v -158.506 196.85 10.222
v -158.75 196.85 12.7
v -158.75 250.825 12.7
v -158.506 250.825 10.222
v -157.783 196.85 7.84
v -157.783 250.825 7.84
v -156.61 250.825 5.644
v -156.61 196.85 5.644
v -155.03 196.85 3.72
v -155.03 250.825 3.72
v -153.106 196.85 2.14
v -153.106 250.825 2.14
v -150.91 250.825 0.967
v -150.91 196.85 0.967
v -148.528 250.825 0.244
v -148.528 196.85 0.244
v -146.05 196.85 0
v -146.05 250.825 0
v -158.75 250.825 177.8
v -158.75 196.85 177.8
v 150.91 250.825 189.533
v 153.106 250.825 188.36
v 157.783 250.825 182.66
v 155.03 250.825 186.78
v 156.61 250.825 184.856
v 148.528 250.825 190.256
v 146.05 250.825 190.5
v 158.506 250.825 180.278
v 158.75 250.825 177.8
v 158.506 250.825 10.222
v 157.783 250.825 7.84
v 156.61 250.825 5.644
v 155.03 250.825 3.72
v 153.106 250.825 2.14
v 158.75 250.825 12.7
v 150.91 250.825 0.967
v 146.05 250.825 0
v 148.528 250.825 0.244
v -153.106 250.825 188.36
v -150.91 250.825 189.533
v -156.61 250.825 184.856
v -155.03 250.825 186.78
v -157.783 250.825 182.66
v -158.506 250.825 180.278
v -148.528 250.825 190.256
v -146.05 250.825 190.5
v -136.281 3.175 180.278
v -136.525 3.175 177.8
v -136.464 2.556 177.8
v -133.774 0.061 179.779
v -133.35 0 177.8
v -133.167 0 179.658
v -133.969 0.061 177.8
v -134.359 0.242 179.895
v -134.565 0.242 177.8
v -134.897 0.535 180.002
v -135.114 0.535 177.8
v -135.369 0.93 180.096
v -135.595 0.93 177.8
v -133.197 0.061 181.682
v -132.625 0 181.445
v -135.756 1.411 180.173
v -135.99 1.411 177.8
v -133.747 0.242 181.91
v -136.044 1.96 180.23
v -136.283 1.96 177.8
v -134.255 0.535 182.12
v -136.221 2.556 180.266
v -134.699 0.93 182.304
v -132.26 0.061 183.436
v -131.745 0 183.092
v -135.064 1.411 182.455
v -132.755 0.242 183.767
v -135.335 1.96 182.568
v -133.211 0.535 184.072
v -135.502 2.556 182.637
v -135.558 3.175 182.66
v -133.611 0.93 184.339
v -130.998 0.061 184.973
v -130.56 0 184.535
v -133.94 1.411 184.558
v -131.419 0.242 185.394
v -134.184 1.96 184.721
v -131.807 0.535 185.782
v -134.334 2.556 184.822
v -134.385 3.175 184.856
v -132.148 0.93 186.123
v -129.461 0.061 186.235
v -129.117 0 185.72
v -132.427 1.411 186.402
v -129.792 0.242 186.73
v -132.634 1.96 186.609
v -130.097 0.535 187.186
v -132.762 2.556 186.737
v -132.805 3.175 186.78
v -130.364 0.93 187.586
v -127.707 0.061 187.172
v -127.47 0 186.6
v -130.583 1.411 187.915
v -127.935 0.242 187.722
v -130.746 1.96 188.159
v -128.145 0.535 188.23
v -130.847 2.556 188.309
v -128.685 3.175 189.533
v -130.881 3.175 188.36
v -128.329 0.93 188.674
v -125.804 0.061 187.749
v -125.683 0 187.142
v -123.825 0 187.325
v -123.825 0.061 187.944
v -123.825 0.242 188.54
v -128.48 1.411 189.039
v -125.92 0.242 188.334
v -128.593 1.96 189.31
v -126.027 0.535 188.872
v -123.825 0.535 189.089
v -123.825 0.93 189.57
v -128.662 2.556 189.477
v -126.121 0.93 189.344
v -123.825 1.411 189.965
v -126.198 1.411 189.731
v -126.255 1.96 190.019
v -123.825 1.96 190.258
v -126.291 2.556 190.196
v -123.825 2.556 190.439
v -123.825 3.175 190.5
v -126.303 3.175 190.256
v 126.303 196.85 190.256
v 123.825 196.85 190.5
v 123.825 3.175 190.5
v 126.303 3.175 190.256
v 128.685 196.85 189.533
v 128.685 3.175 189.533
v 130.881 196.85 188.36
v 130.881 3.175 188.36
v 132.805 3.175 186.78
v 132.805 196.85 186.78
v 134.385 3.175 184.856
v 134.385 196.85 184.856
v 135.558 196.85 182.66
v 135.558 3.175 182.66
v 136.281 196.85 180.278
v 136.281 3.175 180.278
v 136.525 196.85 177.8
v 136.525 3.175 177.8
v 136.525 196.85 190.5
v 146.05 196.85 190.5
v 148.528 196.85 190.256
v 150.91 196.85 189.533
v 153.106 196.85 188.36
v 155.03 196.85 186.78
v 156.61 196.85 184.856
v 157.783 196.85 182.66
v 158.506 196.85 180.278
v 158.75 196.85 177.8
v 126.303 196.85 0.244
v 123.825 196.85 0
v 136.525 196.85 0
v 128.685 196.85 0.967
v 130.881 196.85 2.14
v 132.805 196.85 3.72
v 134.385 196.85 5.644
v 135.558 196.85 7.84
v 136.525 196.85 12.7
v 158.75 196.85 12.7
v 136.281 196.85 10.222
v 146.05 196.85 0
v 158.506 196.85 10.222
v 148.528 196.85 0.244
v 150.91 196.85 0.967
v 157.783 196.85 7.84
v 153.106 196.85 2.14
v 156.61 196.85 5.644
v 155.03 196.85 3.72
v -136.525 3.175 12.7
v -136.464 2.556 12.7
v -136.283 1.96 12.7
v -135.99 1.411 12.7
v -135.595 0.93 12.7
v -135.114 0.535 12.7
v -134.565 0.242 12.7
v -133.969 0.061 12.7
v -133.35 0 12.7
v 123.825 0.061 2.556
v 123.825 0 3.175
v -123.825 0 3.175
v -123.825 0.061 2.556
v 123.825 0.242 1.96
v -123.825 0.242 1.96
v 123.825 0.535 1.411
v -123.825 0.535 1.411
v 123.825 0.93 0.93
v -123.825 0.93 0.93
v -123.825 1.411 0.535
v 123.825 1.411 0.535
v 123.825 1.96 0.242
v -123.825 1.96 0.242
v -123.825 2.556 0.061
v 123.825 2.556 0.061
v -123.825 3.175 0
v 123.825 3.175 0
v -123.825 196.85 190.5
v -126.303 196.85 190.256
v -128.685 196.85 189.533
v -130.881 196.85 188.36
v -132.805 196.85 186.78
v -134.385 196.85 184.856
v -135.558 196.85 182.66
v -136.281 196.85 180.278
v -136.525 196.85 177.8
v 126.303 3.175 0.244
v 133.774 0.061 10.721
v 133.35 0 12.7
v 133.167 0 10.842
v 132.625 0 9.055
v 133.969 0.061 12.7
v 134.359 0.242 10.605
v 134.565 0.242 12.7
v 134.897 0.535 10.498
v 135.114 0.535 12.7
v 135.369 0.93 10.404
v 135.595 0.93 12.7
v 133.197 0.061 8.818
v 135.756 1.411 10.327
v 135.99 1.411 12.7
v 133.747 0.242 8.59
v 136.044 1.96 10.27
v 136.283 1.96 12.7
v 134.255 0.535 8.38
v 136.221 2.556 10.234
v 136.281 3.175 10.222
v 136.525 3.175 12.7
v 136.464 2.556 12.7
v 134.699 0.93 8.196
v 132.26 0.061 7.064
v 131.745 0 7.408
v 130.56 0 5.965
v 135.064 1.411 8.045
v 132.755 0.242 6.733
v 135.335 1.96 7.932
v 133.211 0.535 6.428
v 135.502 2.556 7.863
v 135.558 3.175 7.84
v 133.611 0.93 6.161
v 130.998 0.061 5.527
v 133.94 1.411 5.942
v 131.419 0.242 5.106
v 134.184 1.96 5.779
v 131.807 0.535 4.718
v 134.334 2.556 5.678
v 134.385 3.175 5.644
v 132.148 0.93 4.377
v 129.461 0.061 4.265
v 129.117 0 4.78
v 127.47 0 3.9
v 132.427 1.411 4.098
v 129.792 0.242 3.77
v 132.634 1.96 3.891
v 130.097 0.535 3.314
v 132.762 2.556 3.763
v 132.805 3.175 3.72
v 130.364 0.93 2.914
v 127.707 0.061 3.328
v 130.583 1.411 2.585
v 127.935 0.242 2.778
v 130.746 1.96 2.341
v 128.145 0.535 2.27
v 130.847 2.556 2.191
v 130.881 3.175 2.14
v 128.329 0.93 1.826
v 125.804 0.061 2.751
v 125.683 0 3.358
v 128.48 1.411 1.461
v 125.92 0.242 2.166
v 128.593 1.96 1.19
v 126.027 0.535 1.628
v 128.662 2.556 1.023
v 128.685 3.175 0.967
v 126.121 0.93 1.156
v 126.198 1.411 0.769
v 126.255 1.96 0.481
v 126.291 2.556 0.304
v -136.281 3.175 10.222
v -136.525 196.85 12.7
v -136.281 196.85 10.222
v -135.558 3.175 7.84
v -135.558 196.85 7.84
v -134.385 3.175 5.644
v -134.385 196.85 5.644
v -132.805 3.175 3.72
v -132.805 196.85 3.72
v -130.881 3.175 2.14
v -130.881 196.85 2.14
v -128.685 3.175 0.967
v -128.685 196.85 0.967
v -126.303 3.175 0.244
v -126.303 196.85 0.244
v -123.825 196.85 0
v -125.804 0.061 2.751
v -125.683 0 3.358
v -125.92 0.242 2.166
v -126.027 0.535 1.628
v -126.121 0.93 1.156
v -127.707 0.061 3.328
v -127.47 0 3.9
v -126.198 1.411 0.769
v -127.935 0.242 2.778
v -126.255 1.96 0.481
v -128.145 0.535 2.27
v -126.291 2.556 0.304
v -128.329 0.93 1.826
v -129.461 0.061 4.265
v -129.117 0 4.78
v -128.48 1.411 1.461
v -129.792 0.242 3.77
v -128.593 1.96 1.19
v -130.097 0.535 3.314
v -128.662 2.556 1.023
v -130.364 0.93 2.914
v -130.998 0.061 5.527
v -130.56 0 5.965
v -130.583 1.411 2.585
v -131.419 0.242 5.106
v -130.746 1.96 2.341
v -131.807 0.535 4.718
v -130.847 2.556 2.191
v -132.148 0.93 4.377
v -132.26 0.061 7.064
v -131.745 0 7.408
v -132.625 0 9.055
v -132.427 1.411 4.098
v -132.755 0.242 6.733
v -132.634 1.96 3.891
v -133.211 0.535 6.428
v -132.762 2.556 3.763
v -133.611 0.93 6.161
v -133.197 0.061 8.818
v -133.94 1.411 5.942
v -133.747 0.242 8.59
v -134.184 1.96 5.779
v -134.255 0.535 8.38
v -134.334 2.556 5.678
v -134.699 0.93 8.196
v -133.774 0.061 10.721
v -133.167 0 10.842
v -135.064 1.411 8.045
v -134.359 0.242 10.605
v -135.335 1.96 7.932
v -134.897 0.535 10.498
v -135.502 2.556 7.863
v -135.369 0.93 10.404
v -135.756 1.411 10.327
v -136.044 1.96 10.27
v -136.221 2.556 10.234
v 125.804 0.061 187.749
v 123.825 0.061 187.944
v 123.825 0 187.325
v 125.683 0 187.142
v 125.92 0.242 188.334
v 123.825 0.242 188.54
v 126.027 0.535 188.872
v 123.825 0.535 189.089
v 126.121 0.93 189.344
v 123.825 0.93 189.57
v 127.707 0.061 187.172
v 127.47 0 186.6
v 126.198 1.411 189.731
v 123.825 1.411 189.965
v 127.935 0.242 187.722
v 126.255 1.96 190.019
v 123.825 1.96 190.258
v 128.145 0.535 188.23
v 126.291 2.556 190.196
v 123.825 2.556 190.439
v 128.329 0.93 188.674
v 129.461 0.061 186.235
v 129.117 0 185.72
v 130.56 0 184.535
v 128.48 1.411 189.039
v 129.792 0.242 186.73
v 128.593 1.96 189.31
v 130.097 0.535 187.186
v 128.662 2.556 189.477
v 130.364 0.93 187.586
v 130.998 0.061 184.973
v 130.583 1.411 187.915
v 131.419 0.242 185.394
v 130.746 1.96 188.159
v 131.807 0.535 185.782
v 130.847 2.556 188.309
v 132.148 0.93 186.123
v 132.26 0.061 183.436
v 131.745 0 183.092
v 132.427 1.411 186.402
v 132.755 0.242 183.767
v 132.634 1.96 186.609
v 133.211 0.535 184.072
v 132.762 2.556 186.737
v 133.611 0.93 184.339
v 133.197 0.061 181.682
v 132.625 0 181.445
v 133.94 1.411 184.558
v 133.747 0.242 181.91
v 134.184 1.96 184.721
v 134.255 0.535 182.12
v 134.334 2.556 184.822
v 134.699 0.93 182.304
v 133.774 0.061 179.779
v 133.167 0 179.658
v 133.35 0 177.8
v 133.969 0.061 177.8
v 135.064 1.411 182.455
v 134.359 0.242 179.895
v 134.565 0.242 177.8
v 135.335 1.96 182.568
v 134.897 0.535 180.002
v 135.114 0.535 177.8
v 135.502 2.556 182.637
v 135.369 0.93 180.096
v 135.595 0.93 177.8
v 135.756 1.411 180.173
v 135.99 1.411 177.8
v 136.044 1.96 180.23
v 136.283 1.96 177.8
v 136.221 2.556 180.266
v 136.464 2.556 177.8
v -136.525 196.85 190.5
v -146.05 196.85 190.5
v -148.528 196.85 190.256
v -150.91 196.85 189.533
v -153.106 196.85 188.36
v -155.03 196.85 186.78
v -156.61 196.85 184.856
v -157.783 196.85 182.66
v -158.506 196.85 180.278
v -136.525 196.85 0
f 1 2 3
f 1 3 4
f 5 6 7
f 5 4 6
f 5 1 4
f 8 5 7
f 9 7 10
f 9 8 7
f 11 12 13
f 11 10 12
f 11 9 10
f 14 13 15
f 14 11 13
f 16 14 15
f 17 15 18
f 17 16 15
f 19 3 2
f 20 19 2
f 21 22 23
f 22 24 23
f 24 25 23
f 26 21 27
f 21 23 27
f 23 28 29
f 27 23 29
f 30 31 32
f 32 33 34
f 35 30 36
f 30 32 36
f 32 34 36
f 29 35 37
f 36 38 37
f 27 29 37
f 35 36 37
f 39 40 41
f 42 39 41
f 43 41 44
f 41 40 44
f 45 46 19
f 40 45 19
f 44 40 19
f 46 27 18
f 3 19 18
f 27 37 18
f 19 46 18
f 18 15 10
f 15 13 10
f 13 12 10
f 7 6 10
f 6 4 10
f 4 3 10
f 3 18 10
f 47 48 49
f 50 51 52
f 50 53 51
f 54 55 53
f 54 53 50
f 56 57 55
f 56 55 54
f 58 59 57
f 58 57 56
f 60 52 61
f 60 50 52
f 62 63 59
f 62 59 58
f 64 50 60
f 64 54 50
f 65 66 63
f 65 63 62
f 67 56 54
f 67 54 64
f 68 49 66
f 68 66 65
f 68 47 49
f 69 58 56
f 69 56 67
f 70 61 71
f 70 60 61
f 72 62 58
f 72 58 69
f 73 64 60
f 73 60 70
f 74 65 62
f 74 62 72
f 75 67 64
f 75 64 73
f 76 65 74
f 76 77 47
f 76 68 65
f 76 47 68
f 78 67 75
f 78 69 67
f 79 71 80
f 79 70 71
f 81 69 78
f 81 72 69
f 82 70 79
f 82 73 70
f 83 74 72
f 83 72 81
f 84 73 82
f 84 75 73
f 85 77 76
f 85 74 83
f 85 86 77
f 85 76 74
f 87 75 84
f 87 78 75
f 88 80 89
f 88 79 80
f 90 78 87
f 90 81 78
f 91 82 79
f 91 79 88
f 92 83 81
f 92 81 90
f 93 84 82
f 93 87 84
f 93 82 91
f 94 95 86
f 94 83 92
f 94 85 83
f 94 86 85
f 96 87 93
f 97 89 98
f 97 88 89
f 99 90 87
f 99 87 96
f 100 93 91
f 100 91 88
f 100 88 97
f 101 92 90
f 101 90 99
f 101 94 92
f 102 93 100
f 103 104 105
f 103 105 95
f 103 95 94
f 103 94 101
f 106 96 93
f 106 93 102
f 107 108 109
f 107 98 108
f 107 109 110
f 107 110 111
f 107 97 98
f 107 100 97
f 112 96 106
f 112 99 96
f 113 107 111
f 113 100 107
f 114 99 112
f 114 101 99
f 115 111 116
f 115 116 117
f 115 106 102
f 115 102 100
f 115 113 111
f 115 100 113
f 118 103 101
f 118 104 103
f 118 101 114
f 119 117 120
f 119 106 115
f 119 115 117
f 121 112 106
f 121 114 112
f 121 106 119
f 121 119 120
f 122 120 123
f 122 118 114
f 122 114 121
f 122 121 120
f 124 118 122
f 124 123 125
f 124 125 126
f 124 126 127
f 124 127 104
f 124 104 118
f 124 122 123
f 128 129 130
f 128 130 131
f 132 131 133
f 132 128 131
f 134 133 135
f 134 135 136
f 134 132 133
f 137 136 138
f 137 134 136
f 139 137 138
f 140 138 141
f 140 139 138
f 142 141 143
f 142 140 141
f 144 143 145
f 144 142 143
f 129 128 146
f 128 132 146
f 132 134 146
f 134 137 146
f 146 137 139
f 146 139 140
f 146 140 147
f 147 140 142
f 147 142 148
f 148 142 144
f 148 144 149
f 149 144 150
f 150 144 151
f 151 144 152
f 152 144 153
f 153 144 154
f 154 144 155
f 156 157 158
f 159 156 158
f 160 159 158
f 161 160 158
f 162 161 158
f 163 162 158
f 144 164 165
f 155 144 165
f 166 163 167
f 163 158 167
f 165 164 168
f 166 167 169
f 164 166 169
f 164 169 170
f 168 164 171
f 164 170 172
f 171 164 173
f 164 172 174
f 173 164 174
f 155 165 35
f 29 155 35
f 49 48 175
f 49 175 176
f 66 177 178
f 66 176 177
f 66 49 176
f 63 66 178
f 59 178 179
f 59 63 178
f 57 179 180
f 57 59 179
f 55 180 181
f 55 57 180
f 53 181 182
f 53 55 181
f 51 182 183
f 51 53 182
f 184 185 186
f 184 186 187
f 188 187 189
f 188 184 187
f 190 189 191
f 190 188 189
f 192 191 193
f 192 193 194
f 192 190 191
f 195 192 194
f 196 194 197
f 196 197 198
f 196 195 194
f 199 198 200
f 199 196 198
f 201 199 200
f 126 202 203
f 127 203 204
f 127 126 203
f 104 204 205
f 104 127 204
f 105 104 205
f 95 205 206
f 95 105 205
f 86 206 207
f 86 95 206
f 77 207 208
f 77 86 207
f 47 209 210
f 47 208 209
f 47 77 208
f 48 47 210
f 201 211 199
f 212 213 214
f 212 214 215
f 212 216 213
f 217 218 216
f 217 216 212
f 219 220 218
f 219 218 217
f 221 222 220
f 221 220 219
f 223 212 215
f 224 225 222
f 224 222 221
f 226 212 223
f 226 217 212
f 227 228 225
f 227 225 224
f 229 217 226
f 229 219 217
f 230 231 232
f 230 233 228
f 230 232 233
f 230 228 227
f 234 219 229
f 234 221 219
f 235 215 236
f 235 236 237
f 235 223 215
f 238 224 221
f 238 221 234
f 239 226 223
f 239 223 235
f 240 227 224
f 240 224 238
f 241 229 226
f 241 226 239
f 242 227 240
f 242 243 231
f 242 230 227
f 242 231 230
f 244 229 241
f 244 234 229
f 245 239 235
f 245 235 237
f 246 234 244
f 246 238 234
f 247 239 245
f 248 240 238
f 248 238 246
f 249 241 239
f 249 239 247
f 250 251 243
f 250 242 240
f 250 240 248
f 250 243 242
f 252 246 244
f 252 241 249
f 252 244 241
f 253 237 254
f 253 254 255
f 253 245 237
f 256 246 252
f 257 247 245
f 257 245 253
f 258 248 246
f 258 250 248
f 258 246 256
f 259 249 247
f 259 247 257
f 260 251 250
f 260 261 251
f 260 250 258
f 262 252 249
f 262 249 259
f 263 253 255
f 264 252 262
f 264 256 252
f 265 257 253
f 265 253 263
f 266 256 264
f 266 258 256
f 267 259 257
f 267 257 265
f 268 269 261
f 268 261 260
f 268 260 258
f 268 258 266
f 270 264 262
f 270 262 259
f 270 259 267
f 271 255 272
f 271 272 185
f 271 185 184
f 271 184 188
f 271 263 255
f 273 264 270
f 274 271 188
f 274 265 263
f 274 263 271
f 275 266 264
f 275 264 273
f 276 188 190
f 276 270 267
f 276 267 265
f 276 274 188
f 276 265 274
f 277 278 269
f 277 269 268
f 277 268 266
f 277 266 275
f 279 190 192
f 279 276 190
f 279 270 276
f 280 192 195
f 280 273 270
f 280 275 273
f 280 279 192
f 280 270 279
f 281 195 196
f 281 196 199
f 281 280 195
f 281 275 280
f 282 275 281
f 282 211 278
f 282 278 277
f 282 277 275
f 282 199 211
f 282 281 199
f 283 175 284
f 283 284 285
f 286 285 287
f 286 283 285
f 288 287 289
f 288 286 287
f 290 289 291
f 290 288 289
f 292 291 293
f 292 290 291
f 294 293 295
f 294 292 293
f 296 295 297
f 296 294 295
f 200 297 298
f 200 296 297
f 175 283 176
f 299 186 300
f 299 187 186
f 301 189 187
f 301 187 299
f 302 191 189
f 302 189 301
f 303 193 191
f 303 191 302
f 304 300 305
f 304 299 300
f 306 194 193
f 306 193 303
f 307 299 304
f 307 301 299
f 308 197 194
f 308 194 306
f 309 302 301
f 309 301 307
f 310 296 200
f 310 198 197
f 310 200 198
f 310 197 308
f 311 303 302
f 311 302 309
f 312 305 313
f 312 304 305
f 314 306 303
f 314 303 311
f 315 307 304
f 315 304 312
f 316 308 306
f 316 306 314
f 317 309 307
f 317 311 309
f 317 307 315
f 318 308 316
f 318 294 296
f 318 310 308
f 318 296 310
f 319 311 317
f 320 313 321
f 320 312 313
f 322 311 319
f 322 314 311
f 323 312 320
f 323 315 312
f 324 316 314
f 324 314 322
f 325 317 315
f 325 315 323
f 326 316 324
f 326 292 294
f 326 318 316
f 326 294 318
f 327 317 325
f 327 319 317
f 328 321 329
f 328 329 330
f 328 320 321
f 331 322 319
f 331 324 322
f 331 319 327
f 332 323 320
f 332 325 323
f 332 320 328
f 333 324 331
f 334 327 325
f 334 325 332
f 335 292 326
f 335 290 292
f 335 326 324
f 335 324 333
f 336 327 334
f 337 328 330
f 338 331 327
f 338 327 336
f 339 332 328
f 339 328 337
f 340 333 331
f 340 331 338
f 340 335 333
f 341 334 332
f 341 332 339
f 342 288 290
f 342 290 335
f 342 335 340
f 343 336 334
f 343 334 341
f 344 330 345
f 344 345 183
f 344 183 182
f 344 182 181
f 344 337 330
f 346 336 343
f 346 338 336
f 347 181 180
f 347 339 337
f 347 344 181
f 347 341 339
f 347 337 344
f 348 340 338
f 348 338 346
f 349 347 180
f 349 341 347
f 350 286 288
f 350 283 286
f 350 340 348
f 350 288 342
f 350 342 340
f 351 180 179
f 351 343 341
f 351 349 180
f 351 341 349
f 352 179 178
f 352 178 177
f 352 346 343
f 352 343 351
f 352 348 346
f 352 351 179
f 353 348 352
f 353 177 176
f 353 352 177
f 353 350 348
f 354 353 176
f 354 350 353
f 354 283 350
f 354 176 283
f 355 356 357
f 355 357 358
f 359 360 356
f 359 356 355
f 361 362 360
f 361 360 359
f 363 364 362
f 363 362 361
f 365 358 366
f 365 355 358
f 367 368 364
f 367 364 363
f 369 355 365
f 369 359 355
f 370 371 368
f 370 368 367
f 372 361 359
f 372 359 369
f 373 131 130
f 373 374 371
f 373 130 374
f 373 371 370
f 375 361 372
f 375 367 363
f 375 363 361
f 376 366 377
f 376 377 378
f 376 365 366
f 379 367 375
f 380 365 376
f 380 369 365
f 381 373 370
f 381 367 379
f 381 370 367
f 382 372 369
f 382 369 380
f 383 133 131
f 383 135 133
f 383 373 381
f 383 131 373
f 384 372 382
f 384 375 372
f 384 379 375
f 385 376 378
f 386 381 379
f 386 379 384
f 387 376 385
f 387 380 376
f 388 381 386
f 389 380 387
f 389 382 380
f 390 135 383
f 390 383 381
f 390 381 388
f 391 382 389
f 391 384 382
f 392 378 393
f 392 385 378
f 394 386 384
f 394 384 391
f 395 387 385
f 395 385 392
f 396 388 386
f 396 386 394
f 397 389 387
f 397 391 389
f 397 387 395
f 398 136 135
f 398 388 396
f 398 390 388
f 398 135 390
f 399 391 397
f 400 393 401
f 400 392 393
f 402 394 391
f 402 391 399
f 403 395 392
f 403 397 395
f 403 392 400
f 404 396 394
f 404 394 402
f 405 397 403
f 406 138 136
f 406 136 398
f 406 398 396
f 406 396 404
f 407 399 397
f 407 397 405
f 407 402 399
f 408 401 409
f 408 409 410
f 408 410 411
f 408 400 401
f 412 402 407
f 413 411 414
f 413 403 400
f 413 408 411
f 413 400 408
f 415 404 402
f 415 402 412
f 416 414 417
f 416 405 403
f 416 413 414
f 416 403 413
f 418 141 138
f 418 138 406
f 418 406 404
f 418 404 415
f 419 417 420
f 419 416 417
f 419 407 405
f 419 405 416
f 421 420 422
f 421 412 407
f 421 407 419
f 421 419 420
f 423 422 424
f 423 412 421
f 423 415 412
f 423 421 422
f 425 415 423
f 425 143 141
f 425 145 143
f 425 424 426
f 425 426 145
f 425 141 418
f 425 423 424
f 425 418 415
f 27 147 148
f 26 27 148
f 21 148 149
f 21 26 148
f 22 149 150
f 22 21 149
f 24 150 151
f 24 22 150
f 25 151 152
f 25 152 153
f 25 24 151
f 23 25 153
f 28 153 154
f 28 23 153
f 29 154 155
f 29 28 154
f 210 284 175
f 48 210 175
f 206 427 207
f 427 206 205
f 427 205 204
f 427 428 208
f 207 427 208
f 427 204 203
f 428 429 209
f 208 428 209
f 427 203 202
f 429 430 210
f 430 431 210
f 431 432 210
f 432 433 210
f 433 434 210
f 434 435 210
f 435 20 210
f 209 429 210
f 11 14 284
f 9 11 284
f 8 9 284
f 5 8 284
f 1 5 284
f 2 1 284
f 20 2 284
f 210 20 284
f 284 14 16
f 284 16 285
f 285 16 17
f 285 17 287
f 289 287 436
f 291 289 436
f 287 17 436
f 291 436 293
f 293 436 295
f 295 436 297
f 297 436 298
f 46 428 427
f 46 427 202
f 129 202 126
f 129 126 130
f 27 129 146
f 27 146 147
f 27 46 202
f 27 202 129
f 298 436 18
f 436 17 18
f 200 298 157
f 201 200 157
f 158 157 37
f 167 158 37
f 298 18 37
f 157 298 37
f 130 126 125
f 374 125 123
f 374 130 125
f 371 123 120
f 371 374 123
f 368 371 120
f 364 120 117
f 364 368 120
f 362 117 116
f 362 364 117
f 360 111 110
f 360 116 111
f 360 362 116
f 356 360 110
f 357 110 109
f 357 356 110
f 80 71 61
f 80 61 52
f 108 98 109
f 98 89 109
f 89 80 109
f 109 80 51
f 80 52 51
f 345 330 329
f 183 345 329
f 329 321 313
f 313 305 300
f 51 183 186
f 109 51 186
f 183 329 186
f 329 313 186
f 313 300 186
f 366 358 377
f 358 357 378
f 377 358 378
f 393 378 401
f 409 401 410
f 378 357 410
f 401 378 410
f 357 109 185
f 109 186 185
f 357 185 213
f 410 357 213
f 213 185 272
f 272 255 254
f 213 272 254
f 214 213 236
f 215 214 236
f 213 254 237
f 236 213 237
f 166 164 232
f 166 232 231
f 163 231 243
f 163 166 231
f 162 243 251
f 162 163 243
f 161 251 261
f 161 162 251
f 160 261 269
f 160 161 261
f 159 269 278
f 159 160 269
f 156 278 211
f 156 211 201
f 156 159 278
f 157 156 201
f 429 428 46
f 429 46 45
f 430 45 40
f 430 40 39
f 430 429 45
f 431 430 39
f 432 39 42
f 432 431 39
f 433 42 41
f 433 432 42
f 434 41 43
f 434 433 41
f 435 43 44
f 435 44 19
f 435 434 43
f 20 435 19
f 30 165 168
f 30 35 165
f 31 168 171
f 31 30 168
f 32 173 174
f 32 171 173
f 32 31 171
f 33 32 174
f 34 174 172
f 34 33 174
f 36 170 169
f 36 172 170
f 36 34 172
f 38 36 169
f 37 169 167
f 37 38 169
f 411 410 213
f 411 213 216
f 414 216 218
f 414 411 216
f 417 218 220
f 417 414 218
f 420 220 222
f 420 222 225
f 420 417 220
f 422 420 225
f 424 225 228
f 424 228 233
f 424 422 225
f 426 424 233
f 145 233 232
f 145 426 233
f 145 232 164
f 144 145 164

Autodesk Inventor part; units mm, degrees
ref_plane "YZ Plane" through (0, 0, 0) normal (1, 0, 0) x (0, 1, 0)
ref_plane "XZ Plane" through (0, 0, 0) normal (0, 1, 0) x (-1, 0, 0)
ref_plane "XY Plane" through (0, 0, 0) normal (0, 0, 1) x (1, 0, 0)
sketch "Sketch1" plane through (0, 0, 0) normal (0, 0, 1) x (1, 0, 0)
  line L0 (-136.525, 0) -> (136.525, 0)
  line L1 (136.525, 0) -> (136.525, 196.85)
  line L2 (136.525, 196.85) -> (-136.525, 196.85)
  line L3 (-136.525, 196.85) -> (-136.525, 0)
  line L4 (-158.75, 196.85) -> (158.75, 196.85)
  line L5 (158.75, 196.85) -> (158.75, 250.825)
  line L6 (158.75, 250.825) -> (-158.75, 250.825)
  line L7 (-158.75, 250.825) -> (-158.75, 196.85)
  point P0 (0, 0)
  point P1 (0, 196.85)
  point P2 (0, 0)
  dimension "d0" = 250.825
  dimension "d1" = 317.5
  dimension "d2" = 196.85
  dimension "d3" = 273.05
extrude "Extrusion1" add sketch "Sketch1" along normal blind 190.5
fillet "Fillet1" radius 3.175 4 edges at (0, 0, 190.5) (136.525, 0, 95.25) (0, 0, 0) (-136.525, 0, 95.25)
fillet "Fillet1" radius 12.7 8 edges at (136.525, 98.425, 190.5) (136.525, 98.425, 0) (-136.525, 98.425, 190.5) (-136.525, 98.425, 0) (-158.75, 223.8375, 190.5) (-158.75, 223.8375, 0) (158.75, 223.8375, 190.5) (158.75, 223.8375, 0)
properties part number "battery"
